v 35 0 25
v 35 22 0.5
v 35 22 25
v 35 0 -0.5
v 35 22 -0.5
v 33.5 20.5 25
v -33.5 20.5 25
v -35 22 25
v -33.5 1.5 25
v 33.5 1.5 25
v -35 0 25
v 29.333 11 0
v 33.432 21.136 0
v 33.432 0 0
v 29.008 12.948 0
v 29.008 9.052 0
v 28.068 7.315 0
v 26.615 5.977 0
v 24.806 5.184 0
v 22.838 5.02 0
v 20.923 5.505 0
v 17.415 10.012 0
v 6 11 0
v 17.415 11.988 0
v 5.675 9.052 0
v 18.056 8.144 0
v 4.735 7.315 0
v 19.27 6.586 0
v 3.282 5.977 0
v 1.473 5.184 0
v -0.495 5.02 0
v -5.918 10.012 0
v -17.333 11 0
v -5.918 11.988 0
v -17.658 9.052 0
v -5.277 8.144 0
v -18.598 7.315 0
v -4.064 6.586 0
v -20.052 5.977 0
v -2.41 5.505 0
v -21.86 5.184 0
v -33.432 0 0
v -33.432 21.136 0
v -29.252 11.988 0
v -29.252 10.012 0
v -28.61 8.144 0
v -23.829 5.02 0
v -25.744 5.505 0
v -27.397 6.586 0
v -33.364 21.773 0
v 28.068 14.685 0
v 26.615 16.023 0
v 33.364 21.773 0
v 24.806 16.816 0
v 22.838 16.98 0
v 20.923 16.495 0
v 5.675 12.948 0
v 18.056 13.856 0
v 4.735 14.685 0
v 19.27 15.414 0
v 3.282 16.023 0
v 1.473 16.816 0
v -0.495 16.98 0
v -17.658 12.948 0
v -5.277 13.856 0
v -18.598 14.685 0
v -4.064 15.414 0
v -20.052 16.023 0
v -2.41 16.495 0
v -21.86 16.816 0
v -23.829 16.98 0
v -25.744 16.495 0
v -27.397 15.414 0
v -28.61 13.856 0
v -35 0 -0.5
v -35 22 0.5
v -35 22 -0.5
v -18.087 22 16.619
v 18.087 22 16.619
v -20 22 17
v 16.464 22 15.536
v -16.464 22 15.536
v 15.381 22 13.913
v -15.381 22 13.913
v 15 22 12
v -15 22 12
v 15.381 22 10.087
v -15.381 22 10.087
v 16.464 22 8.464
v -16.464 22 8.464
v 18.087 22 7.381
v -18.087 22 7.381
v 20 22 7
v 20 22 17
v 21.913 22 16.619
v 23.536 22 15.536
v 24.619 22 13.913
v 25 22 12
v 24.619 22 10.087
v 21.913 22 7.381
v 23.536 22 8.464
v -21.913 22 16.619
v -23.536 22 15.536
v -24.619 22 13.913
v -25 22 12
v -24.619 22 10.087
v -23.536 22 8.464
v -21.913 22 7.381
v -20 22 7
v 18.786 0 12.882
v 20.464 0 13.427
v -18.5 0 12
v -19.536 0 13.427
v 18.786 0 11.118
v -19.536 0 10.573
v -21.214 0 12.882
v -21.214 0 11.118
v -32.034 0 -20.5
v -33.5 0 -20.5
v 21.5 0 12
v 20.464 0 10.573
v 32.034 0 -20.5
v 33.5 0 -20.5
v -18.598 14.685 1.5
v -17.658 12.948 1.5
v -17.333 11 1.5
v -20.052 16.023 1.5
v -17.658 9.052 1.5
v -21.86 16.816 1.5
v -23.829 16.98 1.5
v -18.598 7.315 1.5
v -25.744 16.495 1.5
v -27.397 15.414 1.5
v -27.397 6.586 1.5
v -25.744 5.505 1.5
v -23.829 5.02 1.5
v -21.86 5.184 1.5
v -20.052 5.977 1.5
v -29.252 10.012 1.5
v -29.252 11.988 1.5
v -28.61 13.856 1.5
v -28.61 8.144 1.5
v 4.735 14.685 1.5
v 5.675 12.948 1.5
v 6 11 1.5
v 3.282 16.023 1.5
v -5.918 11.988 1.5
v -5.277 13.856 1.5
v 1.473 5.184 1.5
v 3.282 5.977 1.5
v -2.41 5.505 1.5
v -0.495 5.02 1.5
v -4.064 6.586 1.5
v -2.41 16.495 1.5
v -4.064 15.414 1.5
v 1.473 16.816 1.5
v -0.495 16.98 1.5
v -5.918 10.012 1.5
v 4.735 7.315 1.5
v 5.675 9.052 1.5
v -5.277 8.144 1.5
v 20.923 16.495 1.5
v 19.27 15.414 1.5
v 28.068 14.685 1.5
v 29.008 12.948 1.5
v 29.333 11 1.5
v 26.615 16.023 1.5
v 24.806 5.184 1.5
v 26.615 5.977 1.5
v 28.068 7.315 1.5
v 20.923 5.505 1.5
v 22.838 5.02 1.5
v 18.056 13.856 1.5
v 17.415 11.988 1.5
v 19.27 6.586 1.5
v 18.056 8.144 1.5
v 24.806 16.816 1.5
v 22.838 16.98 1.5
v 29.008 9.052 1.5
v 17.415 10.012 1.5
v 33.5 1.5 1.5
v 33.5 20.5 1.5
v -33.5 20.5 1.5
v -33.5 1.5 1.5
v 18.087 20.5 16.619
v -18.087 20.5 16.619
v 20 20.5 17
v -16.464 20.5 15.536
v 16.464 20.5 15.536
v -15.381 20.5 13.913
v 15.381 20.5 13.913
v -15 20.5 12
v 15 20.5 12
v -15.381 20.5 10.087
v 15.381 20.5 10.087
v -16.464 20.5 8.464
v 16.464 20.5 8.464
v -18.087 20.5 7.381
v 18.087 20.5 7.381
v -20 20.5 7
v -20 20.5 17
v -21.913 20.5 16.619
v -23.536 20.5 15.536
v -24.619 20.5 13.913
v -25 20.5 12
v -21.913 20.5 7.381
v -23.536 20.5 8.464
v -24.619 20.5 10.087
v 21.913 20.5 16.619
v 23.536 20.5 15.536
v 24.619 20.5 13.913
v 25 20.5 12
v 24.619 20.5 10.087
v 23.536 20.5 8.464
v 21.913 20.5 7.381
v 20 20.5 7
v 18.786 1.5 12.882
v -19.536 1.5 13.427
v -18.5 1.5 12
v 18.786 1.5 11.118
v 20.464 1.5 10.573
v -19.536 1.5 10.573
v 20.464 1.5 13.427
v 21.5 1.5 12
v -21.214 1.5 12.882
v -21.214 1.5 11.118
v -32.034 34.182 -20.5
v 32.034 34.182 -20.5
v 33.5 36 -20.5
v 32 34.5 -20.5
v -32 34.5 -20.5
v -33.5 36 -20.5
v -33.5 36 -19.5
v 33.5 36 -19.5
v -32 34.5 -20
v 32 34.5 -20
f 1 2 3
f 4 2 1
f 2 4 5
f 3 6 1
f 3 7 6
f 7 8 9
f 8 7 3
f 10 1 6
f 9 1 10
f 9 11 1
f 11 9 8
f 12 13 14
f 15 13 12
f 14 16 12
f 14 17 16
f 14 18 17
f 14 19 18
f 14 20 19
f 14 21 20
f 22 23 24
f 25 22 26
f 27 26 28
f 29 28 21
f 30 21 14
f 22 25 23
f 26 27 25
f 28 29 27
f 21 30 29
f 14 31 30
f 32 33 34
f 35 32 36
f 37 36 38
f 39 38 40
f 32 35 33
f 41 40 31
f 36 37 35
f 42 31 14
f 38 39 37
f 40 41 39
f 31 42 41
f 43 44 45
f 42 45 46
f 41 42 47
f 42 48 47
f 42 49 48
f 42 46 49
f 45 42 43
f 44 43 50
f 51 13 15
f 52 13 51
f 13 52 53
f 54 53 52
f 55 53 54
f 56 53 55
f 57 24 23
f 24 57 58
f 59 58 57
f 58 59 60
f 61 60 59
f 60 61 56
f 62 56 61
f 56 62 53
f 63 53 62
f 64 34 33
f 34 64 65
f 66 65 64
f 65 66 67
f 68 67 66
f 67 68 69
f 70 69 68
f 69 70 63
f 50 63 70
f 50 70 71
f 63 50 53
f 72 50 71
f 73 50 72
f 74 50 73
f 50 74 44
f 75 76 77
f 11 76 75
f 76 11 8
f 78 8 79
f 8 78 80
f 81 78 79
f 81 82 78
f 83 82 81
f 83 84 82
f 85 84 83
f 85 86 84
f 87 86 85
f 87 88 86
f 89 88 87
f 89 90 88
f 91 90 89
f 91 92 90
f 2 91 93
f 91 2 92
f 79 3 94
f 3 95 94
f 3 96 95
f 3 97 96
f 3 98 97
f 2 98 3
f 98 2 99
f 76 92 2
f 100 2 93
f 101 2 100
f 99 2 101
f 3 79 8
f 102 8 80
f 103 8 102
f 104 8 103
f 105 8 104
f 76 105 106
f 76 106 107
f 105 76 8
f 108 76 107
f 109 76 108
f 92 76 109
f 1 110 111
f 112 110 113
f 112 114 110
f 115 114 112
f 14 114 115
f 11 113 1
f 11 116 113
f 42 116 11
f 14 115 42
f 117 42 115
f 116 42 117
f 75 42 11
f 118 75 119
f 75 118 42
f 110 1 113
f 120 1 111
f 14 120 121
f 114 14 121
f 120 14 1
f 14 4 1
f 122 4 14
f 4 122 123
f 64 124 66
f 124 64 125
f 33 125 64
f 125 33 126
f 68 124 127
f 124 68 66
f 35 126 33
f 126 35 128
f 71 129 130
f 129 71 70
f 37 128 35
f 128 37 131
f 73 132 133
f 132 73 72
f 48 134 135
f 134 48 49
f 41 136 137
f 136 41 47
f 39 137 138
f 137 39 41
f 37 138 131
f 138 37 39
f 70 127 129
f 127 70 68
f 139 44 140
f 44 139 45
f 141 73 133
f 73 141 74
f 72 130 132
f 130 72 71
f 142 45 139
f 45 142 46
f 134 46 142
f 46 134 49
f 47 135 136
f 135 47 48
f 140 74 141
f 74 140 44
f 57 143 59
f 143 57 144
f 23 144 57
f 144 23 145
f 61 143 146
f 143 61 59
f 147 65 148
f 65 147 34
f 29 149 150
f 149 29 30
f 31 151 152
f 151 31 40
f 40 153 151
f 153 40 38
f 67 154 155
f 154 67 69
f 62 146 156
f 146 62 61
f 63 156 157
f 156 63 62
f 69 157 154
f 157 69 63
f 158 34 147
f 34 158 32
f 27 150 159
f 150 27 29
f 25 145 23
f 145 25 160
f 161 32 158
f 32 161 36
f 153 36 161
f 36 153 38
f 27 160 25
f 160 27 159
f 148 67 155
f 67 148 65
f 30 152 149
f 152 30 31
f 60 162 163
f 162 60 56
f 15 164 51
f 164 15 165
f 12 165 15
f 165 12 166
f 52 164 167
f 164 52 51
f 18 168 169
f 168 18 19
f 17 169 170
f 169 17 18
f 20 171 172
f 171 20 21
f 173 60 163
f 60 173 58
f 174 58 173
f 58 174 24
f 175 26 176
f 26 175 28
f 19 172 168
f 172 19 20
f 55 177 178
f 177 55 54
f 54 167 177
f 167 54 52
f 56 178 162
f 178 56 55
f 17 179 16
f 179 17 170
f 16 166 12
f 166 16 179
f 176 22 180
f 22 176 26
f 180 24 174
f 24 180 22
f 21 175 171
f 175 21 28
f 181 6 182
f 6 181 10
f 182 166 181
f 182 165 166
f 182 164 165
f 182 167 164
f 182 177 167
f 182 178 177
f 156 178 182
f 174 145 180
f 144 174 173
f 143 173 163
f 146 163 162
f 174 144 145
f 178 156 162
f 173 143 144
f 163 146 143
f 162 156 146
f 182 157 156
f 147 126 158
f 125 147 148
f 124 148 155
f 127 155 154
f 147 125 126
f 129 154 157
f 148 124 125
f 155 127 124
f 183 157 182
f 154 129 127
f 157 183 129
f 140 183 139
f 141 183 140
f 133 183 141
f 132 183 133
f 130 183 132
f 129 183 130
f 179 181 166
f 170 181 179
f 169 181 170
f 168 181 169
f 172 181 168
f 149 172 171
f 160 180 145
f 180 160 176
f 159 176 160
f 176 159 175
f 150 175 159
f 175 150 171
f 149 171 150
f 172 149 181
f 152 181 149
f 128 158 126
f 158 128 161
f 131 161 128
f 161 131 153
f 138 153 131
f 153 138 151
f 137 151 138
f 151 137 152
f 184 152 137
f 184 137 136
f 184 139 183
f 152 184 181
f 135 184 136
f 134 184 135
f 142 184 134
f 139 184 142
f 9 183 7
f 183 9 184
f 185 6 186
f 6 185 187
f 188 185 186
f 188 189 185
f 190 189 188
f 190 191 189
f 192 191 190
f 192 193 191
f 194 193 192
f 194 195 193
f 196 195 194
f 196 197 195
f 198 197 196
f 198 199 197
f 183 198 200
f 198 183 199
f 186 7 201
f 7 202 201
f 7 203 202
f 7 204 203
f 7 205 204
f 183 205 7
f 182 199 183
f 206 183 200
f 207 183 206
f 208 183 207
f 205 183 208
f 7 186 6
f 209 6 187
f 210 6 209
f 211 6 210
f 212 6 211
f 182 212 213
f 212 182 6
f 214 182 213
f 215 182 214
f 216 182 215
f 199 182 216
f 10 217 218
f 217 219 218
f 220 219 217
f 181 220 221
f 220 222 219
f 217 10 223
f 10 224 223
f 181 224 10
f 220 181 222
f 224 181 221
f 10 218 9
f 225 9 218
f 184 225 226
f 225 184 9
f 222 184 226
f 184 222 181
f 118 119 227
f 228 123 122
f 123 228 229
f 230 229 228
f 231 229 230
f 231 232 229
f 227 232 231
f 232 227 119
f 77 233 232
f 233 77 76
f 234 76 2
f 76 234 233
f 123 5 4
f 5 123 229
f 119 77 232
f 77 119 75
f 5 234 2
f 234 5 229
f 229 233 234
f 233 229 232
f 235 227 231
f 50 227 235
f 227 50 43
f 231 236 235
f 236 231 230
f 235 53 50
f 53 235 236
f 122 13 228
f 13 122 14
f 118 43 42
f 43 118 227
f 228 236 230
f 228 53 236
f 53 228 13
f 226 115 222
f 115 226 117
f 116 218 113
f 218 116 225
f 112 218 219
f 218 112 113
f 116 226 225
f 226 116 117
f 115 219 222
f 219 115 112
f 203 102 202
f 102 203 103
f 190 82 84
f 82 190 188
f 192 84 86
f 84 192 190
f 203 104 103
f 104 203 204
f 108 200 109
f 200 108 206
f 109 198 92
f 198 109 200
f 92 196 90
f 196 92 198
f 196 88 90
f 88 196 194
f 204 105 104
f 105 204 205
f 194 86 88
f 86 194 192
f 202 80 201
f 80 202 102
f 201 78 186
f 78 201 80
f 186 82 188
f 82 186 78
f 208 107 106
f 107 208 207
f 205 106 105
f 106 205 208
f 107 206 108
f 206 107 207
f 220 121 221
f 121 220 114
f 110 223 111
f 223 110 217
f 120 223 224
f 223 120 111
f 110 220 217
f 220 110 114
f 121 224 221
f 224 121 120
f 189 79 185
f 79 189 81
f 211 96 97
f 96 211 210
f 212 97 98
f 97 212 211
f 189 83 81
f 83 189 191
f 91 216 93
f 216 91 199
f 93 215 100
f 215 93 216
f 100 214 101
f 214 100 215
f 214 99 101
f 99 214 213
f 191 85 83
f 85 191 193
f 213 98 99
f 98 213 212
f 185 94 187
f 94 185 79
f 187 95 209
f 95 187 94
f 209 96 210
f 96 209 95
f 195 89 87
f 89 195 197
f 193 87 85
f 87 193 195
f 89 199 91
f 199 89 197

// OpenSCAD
dro=[63+4,34+2,116];
bat =[65+5,19+3,25];
shrink=[1.5,1.5,0];


module box(d,b,sh=[0,0,0]){
b1 = [d[0],d[2],1]-sh;
b2 = [b[0],b[2],1]-sh;
echo(b1,b2);
serial_hull(){
    translate([0,0,0])cube(b1);
    translate([0,0,20])cube(b2);
    translate([0,0,40])cube(b2);
    }
}

module top(){
   translate([0,bat[1]/2,bat[2]/2]){
    difference(){
        union(){
            cube(bat,center=true);
             cube([bat[0],bat[1],1],center=true);
        }
      translate([0,0,1.5]) cube(bat-[3,3,0],center=true);
      for(i=[-1:1]){
      translate([bat[0]/3*i,0,-bat[2]/2]) cylinder(d=12,h=10,center=true);
        }
    }
}
}

//top();
module bs(d,h){
b1= [d[0],d[1],1];
translate([0,b1[1]/2,h])
    {
        cube(b1,center=true);
    }
}  

difference(){
    union(){
        top();
    difference(){
        hull(){
            bs(dro,h=-20);
            bs(bat,h=0);
        }
       translate([0,-1.5,.5]){
        hull(){
            bs(dro-[3,0,-3],h=-21);
            bs(bat-[3,0,-3],h=1);
            }
        }
    }
    }
    for(i=[-1,1]){
   translate([20*i,15,12])
    rotate([90,0,0])
    {
        cylinder(r=1.5,h=50,center=true);
        cylinder(r=5,h=20,center=true);
    }
}
}

  




    
